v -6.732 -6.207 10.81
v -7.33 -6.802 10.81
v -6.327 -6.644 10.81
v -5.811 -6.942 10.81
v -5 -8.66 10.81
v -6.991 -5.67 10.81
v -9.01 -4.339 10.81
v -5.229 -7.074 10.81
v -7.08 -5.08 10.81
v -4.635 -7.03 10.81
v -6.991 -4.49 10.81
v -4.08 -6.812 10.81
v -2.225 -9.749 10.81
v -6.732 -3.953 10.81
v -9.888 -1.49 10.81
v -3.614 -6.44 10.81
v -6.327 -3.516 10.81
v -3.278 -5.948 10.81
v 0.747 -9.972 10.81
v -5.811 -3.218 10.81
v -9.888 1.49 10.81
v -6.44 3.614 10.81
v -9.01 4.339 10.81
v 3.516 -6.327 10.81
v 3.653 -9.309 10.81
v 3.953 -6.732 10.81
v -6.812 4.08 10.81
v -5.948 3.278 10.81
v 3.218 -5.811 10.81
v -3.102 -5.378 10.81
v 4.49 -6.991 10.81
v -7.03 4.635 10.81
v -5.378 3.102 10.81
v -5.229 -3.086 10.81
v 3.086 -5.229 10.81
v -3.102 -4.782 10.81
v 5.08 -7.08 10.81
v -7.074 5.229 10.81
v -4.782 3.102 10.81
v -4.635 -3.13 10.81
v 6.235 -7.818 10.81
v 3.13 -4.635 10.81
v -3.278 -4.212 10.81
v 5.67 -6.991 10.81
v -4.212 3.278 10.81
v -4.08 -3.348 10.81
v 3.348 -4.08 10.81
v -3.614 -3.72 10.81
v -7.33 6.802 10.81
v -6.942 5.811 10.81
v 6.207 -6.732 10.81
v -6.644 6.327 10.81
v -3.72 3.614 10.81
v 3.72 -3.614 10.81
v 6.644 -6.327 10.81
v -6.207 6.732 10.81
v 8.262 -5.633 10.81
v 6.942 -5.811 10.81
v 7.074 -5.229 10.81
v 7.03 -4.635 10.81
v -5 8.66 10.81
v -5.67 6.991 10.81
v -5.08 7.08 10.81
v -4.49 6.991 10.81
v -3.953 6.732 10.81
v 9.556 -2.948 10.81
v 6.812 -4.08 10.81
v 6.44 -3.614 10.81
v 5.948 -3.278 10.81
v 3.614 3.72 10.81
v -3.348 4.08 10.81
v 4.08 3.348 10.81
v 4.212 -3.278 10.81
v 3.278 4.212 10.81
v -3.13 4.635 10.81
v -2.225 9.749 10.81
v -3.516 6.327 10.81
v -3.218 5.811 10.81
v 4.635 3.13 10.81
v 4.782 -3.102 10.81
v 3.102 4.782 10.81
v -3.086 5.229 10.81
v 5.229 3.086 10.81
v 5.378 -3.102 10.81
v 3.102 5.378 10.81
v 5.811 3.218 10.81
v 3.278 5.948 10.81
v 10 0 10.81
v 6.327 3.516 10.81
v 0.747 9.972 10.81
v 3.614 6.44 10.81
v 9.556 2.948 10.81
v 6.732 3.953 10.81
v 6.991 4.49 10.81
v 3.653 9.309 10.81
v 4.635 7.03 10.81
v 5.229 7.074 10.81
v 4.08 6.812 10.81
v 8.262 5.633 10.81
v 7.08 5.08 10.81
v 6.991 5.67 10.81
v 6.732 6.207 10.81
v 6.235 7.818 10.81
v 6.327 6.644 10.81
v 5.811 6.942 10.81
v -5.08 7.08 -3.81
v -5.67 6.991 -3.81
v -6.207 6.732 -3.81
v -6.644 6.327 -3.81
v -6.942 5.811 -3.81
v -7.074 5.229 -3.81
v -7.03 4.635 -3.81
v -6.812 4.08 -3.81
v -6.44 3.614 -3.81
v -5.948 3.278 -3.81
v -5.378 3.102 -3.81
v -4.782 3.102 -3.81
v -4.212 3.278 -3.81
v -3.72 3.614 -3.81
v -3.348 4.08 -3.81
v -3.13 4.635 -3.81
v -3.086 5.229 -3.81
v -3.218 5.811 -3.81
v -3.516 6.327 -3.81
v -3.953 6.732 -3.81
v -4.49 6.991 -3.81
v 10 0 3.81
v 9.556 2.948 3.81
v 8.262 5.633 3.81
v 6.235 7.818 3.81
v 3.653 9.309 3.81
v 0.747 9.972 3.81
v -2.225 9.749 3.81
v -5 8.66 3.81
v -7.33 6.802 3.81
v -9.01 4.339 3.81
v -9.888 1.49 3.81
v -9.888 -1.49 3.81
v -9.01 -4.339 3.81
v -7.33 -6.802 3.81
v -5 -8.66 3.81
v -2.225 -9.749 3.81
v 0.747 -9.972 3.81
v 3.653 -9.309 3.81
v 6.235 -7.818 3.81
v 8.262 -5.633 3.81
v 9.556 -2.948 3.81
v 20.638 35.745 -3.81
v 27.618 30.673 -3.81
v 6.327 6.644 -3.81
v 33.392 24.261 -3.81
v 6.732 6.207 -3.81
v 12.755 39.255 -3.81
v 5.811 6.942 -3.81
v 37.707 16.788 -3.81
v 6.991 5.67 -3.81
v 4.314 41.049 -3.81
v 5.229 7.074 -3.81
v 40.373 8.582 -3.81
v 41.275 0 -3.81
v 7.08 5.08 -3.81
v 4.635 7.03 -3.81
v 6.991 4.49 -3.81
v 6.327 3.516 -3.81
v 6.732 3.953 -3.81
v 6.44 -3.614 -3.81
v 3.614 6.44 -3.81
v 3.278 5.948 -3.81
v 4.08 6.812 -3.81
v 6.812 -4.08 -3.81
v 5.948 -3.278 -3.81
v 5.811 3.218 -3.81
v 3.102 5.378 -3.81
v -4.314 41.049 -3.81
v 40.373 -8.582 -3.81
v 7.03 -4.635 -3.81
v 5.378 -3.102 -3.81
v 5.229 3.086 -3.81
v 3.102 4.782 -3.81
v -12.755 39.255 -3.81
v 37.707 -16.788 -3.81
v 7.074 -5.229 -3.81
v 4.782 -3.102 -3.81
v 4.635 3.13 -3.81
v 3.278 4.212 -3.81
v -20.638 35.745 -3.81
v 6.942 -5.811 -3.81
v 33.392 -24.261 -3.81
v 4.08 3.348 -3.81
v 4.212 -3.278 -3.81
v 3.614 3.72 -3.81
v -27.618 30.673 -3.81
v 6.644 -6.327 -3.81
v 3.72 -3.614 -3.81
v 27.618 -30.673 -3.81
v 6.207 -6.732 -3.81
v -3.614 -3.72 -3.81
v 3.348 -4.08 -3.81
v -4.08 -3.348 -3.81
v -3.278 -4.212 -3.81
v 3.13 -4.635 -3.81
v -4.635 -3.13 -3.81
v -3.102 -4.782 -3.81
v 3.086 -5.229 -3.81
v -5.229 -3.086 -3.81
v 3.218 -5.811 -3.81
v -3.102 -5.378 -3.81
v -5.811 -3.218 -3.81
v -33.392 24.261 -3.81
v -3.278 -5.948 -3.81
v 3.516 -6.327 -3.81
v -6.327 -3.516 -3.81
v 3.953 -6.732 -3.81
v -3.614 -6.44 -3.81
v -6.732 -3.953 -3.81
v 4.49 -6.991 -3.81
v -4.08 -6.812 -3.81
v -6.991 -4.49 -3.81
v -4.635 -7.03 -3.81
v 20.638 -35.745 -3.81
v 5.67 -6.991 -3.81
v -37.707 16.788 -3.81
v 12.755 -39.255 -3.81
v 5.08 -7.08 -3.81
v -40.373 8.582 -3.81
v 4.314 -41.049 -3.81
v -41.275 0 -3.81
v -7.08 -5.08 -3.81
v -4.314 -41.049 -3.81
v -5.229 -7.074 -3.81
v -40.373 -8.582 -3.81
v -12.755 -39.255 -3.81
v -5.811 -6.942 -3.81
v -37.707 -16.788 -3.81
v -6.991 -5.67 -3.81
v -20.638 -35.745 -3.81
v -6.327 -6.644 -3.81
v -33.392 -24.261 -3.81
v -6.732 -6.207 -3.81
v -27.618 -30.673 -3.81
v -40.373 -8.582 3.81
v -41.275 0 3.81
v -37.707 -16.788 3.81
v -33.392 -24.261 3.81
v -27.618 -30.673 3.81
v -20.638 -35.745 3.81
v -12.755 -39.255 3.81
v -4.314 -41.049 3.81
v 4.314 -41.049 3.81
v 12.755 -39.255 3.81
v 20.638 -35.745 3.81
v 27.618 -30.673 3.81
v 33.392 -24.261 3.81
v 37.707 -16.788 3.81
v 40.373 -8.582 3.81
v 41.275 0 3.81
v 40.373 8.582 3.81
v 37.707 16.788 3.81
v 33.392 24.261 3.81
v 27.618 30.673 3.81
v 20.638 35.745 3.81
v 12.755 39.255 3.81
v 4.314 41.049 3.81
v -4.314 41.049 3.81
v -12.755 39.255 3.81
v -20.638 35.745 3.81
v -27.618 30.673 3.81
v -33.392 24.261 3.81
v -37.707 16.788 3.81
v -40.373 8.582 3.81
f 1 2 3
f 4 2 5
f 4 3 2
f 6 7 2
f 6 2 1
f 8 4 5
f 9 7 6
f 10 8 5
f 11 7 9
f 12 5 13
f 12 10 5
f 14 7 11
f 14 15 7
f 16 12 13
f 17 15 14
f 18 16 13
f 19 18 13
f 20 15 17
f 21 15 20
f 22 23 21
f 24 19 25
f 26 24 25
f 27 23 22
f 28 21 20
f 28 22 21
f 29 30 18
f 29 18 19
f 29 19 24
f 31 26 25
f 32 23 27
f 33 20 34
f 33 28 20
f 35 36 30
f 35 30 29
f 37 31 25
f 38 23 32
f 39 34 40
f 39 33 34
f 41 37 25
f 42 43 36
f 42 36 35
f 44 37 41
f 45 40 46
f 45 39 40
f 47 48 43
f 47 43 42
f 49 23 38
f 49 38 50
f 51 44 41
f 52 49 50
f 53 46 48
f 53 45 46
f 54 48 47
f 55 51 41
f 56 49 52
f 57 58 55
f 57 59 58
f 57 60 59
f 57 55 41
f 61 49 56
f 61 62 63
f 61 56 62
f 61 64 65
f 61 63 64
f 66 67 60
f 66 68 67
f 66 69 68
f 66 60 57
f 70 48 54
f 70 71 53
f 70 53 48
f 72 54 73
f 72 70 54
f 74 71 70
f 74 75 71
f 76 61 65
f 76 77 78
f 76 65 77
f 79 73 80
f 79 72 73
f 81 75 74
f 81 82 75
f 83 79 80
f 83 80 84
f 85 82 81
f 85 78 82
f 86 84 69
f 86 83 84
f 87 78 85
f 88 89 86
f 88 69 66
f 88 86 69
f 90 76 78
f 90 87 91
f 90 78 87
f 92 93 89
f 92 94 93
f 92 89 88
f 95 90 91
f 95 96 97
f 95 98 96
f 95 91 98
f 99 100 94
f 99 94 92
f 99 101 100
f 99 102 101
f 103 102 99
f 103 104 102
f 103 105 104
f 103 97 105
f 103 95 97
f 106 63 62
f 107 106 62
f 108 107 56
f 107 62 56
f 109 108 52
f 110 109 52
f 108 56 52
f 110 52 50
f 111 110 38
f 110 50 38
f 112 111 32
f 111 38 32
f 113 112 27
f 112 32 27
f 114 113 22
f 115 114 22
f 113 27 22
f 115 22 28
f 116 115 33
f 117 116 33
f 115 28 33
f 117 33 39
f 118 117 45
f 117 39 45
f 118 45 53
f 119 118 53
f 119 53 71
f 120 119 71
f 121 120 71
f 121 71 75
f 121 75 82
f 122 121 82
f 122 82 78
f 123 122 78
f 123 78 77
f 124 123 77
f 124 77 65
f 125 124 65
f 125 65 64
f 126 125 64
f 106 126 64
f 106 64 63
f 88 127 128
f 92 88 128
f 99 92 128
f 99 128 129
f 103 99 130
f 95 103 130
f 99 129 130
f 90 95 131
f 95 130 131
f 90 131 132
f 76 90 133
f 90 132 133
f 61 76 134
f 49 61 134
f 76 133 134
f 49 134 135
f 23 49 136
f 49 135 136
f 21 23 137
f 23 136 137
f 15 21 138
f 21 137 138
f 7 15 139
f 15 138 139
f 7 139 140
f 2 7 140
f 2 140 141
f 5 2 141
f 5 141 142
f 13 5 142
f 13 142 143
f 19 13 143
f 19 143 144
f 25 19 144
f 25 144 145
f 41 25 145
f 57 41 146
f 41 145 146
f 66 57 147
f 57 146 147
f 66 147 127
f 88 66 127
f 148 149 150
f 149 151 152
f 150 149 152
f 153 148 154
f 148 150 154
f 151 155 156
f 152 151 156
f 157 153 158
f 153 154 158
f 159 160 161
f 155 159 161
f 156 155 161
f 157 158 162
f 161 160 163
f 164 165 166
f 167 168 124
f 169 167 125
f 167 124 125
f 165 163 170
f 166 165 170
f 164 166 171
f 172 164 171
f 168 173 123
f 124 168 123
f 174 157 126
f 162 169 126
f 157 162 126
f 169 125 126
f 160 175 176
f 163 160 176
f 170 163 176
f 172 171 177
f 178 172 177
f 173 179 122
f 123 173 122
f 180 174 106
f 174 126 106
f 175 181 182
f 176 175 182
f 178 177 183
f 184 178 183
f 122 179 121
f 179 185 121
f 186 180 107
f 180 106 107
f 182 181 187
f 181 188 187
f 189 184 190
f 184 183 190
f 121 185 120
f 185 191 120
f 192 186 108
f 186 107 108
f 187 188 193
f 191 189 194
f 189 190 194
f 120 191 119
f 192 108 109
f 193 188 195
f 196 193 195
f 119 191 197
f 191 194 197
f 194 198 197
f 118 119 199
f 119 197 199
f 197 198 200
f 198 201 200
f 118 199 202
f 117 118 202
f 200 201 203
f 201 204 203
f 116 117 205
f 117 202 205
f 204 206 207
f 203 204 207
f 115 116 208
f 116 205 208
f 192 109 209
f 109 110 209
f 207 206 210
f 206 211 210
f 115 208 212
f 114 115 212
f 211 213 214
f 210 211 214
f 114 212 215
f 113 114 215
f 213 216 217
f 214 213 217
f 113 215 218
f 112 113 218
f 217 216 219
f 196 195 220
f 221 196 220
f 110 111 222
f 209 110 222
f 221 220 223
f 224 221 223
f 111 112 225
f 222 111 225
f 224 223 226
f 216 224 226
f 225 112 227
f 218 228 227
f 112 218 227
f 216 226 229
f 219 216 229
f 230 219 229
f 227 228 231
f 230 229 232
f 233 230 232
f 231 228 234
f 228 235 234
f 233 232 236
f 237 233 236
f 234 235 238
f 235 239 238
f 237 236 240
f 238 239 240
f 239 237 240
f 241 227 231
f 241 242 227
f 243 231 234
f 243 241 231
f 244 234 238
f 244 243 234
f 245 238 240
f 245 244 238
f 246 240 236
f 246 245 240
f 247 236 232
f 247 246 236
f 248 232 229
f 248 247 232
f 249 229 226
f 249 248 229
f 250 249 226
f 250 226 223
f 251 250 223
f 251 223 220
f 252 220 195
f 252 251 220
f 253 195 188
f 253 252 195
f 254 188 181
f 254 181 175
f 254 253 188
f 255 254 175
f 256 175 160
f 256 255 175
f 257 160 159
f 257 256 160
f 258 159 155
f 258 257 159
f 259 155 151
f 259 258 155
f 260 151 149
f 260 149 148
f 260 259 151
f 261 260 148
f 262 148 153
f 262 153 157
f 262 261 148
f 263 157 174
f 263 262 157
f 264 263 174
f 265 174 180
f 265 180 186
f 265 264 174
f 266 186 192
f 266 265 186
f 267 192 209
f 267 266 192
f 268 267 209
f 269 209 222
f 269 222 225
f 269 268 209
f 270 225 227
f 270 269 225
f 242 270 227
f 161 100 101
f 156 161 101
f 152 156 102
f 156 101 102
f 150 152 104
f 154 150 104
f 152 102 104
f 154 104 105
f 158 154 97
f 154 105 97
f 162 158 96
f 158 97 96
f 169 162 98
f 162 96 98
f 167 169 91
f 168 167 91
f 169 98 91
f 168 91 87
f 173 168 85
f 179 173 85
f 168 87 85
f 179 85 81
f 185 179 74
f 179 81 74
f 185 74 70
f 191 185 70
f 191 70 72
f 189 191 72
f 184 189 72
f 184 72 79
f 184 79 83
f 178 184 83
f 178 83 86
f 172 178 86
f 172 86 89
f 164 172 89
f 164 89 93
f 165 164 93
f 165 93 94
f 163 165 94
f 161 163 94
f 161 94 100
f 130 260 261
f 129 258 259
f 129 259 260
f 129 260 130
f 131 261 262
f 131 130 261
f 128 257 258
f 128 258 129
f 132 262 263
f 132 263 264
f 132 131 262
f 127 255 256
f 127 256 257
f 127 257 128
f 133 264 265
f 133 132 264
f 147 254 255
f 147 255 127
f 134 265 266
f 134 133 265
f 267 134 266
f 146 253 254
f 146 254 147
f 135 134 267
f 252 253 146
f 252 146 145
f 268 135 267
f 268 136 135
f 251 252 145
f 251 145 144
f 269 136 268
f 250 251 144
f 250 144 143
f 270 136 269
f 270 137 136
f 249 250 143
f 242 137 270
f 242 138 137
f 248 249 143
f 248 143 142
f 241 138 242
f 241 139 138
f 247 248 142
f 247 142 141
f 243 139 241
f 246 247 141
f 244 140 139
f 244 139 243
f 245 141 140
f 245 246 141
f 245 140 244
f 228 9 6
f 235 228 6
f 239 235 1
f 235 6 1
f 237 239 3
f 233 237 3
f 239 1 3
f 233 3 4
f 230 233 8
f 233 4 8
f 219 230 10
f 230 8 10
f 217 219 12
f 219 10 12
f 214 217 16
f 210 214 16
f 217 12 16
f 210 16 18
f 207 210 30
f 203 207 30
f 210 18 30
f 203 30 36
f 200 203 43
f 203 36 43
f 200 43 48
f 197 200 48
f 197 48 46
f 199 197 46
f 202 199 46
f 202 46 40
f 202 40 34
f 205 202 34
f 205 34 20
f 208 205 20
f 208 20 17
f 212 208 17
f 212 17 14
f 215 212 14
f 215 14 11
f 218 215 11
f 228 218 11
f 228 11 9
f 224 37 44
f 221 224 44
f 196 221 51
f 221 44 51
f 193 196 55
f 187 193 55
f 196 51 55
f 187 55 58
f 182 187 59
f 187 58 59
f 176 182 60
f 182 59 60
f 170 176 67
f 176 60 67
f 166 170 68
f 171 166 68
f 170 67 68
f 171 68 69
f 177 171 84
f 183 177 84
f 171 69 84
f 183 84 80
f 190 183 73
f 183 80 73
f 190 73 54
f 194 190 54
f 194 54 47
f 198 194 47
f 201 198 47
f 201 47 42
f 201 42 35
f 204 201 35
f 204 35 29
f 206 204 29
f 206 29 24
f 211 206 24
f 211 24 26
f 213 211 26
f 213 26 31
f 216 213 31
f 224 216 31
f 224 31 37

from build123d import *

# Parameters (mm, degrees)
SKETCH5_R           = 41.275
BOSS_EXTRUDE1_DEPTH = 3.81
SKETCH7_R           = 9.999849952
BOSS_EXTRUDE2_DEPTH = 7
SKETCH8_R           = 2
CUT_EXTRUDE1_DEPTH  = 61.174709389
CIRPATTERN1_COUNT   = 4


with BuildPart() as part:
    # Sketch5 → Boss-Extrude1 (new, symmetric)
    with BuildSketch(Plane.XY):
        with Locations(Location((0, 0, 0), (0, 0, 180))):
            Circle(SKETCH5_R)
    extrude(amount=BOSS_EXTRUDE1_DEPTH, both=True)

    # Sketch7 → Boss-Extrude2 (add)
    with BuildSketch(Plane.XY.offset(3.81)):
        Circle(SKETCH7_R)
    extrude(amount=BOSS_EXTRUDE2_DEPTH)

    # Sketch8 → Cut-Extrude1 (cut, through all)
    with BuildSketch(Plane.XY.offset(10.81)):
        with Locations((5.08, 5.08)):
            Circle(SKETCH8_R)
    cut_extrude1 = extrude(amount=-CUT_EXTRUDE1_DEPTH, mode=Mode.SUBTRACT)

    # CirPattern1: Cut-Extrude1 ×4 about axis
    cirpattern1_axis = Axis((0, 0, 0), (0, 0, 1))
    for i in range(1, CIRPATTERN1_COUNT):
        add(cut_extrude1.rotate(cirpattern1_axis, i * 360 / CIRPATTERN1_COUNT), mode=Mode.SUBTRACT)


solid = part.part
